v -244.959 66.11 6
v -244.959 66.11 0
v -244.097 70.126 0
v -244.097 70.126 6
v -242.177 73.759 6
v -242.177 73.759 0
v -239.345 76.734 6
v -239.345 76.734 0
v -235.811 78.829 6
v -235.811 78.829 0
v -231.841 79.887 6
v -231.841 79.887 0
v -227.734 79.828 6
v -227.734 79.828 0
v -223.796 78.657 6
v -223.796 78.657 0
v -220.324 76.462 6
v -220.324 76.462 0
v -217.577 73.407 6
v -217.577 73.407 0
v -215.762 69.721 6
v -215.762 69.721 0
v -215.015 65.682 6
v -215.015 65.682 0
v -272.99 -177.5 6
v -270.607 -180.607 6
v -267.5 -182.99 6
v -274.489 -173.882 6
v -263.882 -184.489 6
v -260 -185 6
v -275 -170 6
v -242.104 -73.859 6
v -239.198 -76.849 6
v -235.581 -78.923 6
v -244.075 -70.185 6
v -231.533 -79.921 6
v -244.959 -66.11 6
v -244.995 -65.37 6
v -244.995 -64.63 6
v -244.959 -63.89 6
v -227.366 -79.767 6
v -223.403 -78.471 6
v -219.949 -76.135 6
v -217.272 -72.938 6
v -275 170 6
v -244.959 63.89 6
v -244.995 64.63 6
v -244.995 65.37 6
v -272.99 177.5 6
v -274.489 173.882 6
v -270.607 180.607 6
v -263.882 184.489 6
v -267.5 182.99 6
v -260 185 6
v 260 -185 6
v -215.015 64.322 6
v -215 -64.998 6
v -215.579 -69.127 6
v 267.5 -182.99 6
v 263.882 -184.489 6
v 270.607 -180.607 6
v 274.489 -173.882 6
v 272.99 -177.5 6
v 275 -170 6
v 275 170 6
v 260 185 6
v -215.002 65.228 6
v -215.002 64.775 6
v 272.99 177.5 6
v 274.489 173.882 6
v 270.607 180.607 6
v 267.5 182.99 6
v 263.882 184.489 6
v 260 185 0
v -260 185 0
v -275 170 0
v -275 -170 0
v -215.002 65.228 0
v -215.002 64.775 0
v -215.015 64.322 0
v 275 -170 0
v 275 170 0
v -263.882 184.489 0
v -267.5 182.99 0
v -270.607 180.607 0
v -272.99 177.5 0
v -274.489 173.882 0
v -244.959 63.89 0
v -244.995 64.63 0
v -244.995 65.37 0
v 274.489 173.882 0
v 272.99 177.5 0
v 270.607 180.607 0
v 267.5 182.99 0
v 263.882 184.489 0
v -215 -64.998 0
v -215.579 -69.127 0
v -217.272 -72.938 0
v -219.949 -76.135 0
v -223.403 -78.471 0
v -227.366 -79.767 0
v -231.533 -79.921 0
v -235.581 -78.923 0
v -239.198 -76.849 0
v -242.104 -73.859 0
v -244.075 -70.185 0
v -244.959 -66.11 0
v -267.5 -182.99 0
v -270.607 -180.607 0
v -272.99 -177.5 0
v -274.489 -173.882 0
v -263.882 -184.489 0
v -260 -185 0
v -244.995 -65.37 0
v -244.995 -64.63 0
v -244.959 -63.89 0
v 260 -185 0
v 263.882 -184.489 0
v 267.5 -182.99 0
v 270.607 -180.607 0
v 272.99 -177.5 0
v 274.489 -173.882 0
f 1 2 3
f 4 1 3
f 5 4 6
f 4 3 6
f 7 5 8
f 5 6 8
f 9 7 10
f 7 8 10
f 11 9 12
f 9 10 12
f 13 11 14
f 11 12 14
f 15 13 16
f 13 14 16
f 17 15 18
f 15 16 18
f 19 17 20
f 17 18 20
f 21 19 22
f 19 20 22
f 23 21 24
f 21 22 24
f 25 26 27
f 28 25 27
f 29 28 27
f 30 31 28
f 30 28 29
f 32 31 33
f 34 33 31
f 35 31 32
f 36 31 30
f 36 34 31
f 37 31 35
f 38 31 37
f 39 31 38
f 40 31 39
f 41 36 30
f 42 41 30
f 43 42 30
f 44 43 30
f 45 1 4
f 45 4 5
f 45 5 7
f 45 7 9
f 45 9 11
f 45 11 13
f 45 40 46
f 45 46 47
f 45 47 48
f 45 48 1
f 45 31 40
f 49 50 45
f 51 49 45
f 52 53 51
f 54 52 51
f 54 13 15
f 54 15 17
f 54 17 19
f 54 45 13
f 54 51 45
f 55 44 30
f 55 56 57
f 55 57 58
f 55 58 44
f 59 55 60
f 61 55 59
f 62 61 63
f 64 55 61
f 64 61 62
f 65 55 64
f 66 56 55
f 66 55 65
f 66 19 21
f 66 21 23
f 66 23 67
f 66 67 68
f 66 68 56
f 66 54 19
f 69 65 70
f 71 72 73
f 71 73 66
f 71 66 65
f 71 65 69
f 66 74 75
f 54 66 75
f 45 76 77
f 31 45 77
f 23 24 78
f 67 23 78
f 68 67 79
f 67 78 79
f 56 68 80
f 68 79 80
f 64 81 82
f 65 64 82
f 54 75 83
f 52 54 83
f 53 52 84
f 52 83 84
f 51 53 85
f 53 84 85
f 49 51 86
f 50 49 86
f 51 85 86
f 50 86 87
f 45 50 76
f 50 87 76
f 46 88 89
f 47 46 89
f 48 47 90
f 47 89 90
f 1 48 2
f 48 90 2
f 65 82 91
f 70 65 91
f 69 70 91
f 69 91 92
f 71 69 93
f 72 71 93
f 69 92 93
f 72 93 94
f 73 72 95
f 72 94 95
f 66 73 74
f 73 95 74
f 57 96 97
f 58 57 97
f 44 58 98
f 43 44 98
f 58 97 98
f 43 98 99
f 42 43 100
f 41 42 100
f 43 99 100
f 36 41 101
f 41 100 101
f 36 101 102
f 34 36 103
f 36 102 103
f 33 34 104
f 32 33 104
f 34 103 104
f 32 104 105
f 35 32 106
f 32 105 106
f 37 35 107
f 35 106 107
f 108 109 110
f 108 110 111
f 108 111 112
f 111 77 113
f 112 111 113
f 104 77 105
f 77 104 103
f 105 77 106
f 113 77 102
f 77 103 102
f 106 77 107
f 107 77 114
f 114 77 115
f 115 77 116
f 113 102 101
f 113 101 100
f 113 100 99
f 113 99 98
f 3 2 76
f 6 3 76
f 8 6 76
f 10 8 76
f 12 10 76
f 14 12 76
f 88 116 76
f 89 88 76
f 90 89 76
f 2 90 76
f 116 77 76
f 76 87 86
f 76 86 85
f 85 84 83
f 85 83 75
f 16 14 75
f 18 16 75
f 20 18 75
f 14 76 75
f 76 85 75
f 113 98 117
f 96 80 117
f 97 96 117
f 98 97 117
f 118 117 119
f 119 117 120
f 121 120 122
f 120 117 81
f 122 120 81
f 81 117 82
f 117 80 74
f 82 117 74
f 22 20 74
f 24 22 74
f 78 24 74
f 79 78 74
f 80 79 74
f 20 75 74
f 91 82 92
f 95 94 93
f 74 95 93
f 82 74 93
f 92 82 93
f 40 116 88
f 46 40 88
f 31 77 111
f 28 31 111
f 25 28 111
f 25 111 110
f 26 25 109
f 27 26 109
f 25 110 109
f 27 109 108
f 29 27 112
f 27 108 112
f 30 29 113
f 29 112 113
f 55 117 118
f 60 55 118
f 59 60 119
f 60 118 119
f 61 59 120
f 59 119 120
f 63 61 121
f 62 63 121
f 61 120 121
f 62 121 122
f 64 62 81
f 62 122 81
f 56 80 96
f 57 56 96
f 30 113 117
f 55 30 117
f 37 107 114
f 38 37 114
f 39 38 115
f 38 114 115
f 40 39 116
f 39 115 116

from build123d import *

# Parameters (mm, degrees)
F1_DEPTH = 6


with BuildPart() as f1:
    # F0 (on Top) → F1 (new body)
    with BuildSketch(Plane.XY):
        with BuildLine():
            ThreePointArc((275, 170), (270.606602, 180.606602), (260, 185))
            Line((260, 185), (-260, 185))
            ThreePointArc((-260, 185), (-270.606602, 180.606602), (-275, 170))
            Line((-275, 170), (-275, -170))
            ThreePointArc((-275, -170), (-270.606602, -180.606602), (-260, -185))
            Line((-260, -185), (260, -185))
            ThreePointArc((260, -185), (270.606602, -180.606602), (275, -170))
            Line((275, -170), (275, 170))
        make_face()
        with BuildLine():
            ThreePointArc((-215.015495, 65.681628), (-215, 65.001779), (-215.015334, 64.321926))
            Line((-215.015334, 64.321926), (-215, -64.998221))
            ThreePointArc((-215, -64.998221), (-229.443822, -79.989685), (-244.958887, -66.109818))
            ThreePointArc((-244.958887, -66.109818), (-245, -65), (-244.958887, -63.890182))
            Line((-244.958887, -63.890182), (-244.958887, 63.890182))
            ThreePointArc((-244.958887, 63.890182), (-245, 65), (-244.958887, 66.109818))
            ThreePointArc((-244.958887, 66.109818), (-229.785522, 79.998467), (-215.015495, 65.681628))
        make_face(mode=Mode.SUBTRACT)
    extrude(amount=F1_DEPTH)


solid = f1.part
